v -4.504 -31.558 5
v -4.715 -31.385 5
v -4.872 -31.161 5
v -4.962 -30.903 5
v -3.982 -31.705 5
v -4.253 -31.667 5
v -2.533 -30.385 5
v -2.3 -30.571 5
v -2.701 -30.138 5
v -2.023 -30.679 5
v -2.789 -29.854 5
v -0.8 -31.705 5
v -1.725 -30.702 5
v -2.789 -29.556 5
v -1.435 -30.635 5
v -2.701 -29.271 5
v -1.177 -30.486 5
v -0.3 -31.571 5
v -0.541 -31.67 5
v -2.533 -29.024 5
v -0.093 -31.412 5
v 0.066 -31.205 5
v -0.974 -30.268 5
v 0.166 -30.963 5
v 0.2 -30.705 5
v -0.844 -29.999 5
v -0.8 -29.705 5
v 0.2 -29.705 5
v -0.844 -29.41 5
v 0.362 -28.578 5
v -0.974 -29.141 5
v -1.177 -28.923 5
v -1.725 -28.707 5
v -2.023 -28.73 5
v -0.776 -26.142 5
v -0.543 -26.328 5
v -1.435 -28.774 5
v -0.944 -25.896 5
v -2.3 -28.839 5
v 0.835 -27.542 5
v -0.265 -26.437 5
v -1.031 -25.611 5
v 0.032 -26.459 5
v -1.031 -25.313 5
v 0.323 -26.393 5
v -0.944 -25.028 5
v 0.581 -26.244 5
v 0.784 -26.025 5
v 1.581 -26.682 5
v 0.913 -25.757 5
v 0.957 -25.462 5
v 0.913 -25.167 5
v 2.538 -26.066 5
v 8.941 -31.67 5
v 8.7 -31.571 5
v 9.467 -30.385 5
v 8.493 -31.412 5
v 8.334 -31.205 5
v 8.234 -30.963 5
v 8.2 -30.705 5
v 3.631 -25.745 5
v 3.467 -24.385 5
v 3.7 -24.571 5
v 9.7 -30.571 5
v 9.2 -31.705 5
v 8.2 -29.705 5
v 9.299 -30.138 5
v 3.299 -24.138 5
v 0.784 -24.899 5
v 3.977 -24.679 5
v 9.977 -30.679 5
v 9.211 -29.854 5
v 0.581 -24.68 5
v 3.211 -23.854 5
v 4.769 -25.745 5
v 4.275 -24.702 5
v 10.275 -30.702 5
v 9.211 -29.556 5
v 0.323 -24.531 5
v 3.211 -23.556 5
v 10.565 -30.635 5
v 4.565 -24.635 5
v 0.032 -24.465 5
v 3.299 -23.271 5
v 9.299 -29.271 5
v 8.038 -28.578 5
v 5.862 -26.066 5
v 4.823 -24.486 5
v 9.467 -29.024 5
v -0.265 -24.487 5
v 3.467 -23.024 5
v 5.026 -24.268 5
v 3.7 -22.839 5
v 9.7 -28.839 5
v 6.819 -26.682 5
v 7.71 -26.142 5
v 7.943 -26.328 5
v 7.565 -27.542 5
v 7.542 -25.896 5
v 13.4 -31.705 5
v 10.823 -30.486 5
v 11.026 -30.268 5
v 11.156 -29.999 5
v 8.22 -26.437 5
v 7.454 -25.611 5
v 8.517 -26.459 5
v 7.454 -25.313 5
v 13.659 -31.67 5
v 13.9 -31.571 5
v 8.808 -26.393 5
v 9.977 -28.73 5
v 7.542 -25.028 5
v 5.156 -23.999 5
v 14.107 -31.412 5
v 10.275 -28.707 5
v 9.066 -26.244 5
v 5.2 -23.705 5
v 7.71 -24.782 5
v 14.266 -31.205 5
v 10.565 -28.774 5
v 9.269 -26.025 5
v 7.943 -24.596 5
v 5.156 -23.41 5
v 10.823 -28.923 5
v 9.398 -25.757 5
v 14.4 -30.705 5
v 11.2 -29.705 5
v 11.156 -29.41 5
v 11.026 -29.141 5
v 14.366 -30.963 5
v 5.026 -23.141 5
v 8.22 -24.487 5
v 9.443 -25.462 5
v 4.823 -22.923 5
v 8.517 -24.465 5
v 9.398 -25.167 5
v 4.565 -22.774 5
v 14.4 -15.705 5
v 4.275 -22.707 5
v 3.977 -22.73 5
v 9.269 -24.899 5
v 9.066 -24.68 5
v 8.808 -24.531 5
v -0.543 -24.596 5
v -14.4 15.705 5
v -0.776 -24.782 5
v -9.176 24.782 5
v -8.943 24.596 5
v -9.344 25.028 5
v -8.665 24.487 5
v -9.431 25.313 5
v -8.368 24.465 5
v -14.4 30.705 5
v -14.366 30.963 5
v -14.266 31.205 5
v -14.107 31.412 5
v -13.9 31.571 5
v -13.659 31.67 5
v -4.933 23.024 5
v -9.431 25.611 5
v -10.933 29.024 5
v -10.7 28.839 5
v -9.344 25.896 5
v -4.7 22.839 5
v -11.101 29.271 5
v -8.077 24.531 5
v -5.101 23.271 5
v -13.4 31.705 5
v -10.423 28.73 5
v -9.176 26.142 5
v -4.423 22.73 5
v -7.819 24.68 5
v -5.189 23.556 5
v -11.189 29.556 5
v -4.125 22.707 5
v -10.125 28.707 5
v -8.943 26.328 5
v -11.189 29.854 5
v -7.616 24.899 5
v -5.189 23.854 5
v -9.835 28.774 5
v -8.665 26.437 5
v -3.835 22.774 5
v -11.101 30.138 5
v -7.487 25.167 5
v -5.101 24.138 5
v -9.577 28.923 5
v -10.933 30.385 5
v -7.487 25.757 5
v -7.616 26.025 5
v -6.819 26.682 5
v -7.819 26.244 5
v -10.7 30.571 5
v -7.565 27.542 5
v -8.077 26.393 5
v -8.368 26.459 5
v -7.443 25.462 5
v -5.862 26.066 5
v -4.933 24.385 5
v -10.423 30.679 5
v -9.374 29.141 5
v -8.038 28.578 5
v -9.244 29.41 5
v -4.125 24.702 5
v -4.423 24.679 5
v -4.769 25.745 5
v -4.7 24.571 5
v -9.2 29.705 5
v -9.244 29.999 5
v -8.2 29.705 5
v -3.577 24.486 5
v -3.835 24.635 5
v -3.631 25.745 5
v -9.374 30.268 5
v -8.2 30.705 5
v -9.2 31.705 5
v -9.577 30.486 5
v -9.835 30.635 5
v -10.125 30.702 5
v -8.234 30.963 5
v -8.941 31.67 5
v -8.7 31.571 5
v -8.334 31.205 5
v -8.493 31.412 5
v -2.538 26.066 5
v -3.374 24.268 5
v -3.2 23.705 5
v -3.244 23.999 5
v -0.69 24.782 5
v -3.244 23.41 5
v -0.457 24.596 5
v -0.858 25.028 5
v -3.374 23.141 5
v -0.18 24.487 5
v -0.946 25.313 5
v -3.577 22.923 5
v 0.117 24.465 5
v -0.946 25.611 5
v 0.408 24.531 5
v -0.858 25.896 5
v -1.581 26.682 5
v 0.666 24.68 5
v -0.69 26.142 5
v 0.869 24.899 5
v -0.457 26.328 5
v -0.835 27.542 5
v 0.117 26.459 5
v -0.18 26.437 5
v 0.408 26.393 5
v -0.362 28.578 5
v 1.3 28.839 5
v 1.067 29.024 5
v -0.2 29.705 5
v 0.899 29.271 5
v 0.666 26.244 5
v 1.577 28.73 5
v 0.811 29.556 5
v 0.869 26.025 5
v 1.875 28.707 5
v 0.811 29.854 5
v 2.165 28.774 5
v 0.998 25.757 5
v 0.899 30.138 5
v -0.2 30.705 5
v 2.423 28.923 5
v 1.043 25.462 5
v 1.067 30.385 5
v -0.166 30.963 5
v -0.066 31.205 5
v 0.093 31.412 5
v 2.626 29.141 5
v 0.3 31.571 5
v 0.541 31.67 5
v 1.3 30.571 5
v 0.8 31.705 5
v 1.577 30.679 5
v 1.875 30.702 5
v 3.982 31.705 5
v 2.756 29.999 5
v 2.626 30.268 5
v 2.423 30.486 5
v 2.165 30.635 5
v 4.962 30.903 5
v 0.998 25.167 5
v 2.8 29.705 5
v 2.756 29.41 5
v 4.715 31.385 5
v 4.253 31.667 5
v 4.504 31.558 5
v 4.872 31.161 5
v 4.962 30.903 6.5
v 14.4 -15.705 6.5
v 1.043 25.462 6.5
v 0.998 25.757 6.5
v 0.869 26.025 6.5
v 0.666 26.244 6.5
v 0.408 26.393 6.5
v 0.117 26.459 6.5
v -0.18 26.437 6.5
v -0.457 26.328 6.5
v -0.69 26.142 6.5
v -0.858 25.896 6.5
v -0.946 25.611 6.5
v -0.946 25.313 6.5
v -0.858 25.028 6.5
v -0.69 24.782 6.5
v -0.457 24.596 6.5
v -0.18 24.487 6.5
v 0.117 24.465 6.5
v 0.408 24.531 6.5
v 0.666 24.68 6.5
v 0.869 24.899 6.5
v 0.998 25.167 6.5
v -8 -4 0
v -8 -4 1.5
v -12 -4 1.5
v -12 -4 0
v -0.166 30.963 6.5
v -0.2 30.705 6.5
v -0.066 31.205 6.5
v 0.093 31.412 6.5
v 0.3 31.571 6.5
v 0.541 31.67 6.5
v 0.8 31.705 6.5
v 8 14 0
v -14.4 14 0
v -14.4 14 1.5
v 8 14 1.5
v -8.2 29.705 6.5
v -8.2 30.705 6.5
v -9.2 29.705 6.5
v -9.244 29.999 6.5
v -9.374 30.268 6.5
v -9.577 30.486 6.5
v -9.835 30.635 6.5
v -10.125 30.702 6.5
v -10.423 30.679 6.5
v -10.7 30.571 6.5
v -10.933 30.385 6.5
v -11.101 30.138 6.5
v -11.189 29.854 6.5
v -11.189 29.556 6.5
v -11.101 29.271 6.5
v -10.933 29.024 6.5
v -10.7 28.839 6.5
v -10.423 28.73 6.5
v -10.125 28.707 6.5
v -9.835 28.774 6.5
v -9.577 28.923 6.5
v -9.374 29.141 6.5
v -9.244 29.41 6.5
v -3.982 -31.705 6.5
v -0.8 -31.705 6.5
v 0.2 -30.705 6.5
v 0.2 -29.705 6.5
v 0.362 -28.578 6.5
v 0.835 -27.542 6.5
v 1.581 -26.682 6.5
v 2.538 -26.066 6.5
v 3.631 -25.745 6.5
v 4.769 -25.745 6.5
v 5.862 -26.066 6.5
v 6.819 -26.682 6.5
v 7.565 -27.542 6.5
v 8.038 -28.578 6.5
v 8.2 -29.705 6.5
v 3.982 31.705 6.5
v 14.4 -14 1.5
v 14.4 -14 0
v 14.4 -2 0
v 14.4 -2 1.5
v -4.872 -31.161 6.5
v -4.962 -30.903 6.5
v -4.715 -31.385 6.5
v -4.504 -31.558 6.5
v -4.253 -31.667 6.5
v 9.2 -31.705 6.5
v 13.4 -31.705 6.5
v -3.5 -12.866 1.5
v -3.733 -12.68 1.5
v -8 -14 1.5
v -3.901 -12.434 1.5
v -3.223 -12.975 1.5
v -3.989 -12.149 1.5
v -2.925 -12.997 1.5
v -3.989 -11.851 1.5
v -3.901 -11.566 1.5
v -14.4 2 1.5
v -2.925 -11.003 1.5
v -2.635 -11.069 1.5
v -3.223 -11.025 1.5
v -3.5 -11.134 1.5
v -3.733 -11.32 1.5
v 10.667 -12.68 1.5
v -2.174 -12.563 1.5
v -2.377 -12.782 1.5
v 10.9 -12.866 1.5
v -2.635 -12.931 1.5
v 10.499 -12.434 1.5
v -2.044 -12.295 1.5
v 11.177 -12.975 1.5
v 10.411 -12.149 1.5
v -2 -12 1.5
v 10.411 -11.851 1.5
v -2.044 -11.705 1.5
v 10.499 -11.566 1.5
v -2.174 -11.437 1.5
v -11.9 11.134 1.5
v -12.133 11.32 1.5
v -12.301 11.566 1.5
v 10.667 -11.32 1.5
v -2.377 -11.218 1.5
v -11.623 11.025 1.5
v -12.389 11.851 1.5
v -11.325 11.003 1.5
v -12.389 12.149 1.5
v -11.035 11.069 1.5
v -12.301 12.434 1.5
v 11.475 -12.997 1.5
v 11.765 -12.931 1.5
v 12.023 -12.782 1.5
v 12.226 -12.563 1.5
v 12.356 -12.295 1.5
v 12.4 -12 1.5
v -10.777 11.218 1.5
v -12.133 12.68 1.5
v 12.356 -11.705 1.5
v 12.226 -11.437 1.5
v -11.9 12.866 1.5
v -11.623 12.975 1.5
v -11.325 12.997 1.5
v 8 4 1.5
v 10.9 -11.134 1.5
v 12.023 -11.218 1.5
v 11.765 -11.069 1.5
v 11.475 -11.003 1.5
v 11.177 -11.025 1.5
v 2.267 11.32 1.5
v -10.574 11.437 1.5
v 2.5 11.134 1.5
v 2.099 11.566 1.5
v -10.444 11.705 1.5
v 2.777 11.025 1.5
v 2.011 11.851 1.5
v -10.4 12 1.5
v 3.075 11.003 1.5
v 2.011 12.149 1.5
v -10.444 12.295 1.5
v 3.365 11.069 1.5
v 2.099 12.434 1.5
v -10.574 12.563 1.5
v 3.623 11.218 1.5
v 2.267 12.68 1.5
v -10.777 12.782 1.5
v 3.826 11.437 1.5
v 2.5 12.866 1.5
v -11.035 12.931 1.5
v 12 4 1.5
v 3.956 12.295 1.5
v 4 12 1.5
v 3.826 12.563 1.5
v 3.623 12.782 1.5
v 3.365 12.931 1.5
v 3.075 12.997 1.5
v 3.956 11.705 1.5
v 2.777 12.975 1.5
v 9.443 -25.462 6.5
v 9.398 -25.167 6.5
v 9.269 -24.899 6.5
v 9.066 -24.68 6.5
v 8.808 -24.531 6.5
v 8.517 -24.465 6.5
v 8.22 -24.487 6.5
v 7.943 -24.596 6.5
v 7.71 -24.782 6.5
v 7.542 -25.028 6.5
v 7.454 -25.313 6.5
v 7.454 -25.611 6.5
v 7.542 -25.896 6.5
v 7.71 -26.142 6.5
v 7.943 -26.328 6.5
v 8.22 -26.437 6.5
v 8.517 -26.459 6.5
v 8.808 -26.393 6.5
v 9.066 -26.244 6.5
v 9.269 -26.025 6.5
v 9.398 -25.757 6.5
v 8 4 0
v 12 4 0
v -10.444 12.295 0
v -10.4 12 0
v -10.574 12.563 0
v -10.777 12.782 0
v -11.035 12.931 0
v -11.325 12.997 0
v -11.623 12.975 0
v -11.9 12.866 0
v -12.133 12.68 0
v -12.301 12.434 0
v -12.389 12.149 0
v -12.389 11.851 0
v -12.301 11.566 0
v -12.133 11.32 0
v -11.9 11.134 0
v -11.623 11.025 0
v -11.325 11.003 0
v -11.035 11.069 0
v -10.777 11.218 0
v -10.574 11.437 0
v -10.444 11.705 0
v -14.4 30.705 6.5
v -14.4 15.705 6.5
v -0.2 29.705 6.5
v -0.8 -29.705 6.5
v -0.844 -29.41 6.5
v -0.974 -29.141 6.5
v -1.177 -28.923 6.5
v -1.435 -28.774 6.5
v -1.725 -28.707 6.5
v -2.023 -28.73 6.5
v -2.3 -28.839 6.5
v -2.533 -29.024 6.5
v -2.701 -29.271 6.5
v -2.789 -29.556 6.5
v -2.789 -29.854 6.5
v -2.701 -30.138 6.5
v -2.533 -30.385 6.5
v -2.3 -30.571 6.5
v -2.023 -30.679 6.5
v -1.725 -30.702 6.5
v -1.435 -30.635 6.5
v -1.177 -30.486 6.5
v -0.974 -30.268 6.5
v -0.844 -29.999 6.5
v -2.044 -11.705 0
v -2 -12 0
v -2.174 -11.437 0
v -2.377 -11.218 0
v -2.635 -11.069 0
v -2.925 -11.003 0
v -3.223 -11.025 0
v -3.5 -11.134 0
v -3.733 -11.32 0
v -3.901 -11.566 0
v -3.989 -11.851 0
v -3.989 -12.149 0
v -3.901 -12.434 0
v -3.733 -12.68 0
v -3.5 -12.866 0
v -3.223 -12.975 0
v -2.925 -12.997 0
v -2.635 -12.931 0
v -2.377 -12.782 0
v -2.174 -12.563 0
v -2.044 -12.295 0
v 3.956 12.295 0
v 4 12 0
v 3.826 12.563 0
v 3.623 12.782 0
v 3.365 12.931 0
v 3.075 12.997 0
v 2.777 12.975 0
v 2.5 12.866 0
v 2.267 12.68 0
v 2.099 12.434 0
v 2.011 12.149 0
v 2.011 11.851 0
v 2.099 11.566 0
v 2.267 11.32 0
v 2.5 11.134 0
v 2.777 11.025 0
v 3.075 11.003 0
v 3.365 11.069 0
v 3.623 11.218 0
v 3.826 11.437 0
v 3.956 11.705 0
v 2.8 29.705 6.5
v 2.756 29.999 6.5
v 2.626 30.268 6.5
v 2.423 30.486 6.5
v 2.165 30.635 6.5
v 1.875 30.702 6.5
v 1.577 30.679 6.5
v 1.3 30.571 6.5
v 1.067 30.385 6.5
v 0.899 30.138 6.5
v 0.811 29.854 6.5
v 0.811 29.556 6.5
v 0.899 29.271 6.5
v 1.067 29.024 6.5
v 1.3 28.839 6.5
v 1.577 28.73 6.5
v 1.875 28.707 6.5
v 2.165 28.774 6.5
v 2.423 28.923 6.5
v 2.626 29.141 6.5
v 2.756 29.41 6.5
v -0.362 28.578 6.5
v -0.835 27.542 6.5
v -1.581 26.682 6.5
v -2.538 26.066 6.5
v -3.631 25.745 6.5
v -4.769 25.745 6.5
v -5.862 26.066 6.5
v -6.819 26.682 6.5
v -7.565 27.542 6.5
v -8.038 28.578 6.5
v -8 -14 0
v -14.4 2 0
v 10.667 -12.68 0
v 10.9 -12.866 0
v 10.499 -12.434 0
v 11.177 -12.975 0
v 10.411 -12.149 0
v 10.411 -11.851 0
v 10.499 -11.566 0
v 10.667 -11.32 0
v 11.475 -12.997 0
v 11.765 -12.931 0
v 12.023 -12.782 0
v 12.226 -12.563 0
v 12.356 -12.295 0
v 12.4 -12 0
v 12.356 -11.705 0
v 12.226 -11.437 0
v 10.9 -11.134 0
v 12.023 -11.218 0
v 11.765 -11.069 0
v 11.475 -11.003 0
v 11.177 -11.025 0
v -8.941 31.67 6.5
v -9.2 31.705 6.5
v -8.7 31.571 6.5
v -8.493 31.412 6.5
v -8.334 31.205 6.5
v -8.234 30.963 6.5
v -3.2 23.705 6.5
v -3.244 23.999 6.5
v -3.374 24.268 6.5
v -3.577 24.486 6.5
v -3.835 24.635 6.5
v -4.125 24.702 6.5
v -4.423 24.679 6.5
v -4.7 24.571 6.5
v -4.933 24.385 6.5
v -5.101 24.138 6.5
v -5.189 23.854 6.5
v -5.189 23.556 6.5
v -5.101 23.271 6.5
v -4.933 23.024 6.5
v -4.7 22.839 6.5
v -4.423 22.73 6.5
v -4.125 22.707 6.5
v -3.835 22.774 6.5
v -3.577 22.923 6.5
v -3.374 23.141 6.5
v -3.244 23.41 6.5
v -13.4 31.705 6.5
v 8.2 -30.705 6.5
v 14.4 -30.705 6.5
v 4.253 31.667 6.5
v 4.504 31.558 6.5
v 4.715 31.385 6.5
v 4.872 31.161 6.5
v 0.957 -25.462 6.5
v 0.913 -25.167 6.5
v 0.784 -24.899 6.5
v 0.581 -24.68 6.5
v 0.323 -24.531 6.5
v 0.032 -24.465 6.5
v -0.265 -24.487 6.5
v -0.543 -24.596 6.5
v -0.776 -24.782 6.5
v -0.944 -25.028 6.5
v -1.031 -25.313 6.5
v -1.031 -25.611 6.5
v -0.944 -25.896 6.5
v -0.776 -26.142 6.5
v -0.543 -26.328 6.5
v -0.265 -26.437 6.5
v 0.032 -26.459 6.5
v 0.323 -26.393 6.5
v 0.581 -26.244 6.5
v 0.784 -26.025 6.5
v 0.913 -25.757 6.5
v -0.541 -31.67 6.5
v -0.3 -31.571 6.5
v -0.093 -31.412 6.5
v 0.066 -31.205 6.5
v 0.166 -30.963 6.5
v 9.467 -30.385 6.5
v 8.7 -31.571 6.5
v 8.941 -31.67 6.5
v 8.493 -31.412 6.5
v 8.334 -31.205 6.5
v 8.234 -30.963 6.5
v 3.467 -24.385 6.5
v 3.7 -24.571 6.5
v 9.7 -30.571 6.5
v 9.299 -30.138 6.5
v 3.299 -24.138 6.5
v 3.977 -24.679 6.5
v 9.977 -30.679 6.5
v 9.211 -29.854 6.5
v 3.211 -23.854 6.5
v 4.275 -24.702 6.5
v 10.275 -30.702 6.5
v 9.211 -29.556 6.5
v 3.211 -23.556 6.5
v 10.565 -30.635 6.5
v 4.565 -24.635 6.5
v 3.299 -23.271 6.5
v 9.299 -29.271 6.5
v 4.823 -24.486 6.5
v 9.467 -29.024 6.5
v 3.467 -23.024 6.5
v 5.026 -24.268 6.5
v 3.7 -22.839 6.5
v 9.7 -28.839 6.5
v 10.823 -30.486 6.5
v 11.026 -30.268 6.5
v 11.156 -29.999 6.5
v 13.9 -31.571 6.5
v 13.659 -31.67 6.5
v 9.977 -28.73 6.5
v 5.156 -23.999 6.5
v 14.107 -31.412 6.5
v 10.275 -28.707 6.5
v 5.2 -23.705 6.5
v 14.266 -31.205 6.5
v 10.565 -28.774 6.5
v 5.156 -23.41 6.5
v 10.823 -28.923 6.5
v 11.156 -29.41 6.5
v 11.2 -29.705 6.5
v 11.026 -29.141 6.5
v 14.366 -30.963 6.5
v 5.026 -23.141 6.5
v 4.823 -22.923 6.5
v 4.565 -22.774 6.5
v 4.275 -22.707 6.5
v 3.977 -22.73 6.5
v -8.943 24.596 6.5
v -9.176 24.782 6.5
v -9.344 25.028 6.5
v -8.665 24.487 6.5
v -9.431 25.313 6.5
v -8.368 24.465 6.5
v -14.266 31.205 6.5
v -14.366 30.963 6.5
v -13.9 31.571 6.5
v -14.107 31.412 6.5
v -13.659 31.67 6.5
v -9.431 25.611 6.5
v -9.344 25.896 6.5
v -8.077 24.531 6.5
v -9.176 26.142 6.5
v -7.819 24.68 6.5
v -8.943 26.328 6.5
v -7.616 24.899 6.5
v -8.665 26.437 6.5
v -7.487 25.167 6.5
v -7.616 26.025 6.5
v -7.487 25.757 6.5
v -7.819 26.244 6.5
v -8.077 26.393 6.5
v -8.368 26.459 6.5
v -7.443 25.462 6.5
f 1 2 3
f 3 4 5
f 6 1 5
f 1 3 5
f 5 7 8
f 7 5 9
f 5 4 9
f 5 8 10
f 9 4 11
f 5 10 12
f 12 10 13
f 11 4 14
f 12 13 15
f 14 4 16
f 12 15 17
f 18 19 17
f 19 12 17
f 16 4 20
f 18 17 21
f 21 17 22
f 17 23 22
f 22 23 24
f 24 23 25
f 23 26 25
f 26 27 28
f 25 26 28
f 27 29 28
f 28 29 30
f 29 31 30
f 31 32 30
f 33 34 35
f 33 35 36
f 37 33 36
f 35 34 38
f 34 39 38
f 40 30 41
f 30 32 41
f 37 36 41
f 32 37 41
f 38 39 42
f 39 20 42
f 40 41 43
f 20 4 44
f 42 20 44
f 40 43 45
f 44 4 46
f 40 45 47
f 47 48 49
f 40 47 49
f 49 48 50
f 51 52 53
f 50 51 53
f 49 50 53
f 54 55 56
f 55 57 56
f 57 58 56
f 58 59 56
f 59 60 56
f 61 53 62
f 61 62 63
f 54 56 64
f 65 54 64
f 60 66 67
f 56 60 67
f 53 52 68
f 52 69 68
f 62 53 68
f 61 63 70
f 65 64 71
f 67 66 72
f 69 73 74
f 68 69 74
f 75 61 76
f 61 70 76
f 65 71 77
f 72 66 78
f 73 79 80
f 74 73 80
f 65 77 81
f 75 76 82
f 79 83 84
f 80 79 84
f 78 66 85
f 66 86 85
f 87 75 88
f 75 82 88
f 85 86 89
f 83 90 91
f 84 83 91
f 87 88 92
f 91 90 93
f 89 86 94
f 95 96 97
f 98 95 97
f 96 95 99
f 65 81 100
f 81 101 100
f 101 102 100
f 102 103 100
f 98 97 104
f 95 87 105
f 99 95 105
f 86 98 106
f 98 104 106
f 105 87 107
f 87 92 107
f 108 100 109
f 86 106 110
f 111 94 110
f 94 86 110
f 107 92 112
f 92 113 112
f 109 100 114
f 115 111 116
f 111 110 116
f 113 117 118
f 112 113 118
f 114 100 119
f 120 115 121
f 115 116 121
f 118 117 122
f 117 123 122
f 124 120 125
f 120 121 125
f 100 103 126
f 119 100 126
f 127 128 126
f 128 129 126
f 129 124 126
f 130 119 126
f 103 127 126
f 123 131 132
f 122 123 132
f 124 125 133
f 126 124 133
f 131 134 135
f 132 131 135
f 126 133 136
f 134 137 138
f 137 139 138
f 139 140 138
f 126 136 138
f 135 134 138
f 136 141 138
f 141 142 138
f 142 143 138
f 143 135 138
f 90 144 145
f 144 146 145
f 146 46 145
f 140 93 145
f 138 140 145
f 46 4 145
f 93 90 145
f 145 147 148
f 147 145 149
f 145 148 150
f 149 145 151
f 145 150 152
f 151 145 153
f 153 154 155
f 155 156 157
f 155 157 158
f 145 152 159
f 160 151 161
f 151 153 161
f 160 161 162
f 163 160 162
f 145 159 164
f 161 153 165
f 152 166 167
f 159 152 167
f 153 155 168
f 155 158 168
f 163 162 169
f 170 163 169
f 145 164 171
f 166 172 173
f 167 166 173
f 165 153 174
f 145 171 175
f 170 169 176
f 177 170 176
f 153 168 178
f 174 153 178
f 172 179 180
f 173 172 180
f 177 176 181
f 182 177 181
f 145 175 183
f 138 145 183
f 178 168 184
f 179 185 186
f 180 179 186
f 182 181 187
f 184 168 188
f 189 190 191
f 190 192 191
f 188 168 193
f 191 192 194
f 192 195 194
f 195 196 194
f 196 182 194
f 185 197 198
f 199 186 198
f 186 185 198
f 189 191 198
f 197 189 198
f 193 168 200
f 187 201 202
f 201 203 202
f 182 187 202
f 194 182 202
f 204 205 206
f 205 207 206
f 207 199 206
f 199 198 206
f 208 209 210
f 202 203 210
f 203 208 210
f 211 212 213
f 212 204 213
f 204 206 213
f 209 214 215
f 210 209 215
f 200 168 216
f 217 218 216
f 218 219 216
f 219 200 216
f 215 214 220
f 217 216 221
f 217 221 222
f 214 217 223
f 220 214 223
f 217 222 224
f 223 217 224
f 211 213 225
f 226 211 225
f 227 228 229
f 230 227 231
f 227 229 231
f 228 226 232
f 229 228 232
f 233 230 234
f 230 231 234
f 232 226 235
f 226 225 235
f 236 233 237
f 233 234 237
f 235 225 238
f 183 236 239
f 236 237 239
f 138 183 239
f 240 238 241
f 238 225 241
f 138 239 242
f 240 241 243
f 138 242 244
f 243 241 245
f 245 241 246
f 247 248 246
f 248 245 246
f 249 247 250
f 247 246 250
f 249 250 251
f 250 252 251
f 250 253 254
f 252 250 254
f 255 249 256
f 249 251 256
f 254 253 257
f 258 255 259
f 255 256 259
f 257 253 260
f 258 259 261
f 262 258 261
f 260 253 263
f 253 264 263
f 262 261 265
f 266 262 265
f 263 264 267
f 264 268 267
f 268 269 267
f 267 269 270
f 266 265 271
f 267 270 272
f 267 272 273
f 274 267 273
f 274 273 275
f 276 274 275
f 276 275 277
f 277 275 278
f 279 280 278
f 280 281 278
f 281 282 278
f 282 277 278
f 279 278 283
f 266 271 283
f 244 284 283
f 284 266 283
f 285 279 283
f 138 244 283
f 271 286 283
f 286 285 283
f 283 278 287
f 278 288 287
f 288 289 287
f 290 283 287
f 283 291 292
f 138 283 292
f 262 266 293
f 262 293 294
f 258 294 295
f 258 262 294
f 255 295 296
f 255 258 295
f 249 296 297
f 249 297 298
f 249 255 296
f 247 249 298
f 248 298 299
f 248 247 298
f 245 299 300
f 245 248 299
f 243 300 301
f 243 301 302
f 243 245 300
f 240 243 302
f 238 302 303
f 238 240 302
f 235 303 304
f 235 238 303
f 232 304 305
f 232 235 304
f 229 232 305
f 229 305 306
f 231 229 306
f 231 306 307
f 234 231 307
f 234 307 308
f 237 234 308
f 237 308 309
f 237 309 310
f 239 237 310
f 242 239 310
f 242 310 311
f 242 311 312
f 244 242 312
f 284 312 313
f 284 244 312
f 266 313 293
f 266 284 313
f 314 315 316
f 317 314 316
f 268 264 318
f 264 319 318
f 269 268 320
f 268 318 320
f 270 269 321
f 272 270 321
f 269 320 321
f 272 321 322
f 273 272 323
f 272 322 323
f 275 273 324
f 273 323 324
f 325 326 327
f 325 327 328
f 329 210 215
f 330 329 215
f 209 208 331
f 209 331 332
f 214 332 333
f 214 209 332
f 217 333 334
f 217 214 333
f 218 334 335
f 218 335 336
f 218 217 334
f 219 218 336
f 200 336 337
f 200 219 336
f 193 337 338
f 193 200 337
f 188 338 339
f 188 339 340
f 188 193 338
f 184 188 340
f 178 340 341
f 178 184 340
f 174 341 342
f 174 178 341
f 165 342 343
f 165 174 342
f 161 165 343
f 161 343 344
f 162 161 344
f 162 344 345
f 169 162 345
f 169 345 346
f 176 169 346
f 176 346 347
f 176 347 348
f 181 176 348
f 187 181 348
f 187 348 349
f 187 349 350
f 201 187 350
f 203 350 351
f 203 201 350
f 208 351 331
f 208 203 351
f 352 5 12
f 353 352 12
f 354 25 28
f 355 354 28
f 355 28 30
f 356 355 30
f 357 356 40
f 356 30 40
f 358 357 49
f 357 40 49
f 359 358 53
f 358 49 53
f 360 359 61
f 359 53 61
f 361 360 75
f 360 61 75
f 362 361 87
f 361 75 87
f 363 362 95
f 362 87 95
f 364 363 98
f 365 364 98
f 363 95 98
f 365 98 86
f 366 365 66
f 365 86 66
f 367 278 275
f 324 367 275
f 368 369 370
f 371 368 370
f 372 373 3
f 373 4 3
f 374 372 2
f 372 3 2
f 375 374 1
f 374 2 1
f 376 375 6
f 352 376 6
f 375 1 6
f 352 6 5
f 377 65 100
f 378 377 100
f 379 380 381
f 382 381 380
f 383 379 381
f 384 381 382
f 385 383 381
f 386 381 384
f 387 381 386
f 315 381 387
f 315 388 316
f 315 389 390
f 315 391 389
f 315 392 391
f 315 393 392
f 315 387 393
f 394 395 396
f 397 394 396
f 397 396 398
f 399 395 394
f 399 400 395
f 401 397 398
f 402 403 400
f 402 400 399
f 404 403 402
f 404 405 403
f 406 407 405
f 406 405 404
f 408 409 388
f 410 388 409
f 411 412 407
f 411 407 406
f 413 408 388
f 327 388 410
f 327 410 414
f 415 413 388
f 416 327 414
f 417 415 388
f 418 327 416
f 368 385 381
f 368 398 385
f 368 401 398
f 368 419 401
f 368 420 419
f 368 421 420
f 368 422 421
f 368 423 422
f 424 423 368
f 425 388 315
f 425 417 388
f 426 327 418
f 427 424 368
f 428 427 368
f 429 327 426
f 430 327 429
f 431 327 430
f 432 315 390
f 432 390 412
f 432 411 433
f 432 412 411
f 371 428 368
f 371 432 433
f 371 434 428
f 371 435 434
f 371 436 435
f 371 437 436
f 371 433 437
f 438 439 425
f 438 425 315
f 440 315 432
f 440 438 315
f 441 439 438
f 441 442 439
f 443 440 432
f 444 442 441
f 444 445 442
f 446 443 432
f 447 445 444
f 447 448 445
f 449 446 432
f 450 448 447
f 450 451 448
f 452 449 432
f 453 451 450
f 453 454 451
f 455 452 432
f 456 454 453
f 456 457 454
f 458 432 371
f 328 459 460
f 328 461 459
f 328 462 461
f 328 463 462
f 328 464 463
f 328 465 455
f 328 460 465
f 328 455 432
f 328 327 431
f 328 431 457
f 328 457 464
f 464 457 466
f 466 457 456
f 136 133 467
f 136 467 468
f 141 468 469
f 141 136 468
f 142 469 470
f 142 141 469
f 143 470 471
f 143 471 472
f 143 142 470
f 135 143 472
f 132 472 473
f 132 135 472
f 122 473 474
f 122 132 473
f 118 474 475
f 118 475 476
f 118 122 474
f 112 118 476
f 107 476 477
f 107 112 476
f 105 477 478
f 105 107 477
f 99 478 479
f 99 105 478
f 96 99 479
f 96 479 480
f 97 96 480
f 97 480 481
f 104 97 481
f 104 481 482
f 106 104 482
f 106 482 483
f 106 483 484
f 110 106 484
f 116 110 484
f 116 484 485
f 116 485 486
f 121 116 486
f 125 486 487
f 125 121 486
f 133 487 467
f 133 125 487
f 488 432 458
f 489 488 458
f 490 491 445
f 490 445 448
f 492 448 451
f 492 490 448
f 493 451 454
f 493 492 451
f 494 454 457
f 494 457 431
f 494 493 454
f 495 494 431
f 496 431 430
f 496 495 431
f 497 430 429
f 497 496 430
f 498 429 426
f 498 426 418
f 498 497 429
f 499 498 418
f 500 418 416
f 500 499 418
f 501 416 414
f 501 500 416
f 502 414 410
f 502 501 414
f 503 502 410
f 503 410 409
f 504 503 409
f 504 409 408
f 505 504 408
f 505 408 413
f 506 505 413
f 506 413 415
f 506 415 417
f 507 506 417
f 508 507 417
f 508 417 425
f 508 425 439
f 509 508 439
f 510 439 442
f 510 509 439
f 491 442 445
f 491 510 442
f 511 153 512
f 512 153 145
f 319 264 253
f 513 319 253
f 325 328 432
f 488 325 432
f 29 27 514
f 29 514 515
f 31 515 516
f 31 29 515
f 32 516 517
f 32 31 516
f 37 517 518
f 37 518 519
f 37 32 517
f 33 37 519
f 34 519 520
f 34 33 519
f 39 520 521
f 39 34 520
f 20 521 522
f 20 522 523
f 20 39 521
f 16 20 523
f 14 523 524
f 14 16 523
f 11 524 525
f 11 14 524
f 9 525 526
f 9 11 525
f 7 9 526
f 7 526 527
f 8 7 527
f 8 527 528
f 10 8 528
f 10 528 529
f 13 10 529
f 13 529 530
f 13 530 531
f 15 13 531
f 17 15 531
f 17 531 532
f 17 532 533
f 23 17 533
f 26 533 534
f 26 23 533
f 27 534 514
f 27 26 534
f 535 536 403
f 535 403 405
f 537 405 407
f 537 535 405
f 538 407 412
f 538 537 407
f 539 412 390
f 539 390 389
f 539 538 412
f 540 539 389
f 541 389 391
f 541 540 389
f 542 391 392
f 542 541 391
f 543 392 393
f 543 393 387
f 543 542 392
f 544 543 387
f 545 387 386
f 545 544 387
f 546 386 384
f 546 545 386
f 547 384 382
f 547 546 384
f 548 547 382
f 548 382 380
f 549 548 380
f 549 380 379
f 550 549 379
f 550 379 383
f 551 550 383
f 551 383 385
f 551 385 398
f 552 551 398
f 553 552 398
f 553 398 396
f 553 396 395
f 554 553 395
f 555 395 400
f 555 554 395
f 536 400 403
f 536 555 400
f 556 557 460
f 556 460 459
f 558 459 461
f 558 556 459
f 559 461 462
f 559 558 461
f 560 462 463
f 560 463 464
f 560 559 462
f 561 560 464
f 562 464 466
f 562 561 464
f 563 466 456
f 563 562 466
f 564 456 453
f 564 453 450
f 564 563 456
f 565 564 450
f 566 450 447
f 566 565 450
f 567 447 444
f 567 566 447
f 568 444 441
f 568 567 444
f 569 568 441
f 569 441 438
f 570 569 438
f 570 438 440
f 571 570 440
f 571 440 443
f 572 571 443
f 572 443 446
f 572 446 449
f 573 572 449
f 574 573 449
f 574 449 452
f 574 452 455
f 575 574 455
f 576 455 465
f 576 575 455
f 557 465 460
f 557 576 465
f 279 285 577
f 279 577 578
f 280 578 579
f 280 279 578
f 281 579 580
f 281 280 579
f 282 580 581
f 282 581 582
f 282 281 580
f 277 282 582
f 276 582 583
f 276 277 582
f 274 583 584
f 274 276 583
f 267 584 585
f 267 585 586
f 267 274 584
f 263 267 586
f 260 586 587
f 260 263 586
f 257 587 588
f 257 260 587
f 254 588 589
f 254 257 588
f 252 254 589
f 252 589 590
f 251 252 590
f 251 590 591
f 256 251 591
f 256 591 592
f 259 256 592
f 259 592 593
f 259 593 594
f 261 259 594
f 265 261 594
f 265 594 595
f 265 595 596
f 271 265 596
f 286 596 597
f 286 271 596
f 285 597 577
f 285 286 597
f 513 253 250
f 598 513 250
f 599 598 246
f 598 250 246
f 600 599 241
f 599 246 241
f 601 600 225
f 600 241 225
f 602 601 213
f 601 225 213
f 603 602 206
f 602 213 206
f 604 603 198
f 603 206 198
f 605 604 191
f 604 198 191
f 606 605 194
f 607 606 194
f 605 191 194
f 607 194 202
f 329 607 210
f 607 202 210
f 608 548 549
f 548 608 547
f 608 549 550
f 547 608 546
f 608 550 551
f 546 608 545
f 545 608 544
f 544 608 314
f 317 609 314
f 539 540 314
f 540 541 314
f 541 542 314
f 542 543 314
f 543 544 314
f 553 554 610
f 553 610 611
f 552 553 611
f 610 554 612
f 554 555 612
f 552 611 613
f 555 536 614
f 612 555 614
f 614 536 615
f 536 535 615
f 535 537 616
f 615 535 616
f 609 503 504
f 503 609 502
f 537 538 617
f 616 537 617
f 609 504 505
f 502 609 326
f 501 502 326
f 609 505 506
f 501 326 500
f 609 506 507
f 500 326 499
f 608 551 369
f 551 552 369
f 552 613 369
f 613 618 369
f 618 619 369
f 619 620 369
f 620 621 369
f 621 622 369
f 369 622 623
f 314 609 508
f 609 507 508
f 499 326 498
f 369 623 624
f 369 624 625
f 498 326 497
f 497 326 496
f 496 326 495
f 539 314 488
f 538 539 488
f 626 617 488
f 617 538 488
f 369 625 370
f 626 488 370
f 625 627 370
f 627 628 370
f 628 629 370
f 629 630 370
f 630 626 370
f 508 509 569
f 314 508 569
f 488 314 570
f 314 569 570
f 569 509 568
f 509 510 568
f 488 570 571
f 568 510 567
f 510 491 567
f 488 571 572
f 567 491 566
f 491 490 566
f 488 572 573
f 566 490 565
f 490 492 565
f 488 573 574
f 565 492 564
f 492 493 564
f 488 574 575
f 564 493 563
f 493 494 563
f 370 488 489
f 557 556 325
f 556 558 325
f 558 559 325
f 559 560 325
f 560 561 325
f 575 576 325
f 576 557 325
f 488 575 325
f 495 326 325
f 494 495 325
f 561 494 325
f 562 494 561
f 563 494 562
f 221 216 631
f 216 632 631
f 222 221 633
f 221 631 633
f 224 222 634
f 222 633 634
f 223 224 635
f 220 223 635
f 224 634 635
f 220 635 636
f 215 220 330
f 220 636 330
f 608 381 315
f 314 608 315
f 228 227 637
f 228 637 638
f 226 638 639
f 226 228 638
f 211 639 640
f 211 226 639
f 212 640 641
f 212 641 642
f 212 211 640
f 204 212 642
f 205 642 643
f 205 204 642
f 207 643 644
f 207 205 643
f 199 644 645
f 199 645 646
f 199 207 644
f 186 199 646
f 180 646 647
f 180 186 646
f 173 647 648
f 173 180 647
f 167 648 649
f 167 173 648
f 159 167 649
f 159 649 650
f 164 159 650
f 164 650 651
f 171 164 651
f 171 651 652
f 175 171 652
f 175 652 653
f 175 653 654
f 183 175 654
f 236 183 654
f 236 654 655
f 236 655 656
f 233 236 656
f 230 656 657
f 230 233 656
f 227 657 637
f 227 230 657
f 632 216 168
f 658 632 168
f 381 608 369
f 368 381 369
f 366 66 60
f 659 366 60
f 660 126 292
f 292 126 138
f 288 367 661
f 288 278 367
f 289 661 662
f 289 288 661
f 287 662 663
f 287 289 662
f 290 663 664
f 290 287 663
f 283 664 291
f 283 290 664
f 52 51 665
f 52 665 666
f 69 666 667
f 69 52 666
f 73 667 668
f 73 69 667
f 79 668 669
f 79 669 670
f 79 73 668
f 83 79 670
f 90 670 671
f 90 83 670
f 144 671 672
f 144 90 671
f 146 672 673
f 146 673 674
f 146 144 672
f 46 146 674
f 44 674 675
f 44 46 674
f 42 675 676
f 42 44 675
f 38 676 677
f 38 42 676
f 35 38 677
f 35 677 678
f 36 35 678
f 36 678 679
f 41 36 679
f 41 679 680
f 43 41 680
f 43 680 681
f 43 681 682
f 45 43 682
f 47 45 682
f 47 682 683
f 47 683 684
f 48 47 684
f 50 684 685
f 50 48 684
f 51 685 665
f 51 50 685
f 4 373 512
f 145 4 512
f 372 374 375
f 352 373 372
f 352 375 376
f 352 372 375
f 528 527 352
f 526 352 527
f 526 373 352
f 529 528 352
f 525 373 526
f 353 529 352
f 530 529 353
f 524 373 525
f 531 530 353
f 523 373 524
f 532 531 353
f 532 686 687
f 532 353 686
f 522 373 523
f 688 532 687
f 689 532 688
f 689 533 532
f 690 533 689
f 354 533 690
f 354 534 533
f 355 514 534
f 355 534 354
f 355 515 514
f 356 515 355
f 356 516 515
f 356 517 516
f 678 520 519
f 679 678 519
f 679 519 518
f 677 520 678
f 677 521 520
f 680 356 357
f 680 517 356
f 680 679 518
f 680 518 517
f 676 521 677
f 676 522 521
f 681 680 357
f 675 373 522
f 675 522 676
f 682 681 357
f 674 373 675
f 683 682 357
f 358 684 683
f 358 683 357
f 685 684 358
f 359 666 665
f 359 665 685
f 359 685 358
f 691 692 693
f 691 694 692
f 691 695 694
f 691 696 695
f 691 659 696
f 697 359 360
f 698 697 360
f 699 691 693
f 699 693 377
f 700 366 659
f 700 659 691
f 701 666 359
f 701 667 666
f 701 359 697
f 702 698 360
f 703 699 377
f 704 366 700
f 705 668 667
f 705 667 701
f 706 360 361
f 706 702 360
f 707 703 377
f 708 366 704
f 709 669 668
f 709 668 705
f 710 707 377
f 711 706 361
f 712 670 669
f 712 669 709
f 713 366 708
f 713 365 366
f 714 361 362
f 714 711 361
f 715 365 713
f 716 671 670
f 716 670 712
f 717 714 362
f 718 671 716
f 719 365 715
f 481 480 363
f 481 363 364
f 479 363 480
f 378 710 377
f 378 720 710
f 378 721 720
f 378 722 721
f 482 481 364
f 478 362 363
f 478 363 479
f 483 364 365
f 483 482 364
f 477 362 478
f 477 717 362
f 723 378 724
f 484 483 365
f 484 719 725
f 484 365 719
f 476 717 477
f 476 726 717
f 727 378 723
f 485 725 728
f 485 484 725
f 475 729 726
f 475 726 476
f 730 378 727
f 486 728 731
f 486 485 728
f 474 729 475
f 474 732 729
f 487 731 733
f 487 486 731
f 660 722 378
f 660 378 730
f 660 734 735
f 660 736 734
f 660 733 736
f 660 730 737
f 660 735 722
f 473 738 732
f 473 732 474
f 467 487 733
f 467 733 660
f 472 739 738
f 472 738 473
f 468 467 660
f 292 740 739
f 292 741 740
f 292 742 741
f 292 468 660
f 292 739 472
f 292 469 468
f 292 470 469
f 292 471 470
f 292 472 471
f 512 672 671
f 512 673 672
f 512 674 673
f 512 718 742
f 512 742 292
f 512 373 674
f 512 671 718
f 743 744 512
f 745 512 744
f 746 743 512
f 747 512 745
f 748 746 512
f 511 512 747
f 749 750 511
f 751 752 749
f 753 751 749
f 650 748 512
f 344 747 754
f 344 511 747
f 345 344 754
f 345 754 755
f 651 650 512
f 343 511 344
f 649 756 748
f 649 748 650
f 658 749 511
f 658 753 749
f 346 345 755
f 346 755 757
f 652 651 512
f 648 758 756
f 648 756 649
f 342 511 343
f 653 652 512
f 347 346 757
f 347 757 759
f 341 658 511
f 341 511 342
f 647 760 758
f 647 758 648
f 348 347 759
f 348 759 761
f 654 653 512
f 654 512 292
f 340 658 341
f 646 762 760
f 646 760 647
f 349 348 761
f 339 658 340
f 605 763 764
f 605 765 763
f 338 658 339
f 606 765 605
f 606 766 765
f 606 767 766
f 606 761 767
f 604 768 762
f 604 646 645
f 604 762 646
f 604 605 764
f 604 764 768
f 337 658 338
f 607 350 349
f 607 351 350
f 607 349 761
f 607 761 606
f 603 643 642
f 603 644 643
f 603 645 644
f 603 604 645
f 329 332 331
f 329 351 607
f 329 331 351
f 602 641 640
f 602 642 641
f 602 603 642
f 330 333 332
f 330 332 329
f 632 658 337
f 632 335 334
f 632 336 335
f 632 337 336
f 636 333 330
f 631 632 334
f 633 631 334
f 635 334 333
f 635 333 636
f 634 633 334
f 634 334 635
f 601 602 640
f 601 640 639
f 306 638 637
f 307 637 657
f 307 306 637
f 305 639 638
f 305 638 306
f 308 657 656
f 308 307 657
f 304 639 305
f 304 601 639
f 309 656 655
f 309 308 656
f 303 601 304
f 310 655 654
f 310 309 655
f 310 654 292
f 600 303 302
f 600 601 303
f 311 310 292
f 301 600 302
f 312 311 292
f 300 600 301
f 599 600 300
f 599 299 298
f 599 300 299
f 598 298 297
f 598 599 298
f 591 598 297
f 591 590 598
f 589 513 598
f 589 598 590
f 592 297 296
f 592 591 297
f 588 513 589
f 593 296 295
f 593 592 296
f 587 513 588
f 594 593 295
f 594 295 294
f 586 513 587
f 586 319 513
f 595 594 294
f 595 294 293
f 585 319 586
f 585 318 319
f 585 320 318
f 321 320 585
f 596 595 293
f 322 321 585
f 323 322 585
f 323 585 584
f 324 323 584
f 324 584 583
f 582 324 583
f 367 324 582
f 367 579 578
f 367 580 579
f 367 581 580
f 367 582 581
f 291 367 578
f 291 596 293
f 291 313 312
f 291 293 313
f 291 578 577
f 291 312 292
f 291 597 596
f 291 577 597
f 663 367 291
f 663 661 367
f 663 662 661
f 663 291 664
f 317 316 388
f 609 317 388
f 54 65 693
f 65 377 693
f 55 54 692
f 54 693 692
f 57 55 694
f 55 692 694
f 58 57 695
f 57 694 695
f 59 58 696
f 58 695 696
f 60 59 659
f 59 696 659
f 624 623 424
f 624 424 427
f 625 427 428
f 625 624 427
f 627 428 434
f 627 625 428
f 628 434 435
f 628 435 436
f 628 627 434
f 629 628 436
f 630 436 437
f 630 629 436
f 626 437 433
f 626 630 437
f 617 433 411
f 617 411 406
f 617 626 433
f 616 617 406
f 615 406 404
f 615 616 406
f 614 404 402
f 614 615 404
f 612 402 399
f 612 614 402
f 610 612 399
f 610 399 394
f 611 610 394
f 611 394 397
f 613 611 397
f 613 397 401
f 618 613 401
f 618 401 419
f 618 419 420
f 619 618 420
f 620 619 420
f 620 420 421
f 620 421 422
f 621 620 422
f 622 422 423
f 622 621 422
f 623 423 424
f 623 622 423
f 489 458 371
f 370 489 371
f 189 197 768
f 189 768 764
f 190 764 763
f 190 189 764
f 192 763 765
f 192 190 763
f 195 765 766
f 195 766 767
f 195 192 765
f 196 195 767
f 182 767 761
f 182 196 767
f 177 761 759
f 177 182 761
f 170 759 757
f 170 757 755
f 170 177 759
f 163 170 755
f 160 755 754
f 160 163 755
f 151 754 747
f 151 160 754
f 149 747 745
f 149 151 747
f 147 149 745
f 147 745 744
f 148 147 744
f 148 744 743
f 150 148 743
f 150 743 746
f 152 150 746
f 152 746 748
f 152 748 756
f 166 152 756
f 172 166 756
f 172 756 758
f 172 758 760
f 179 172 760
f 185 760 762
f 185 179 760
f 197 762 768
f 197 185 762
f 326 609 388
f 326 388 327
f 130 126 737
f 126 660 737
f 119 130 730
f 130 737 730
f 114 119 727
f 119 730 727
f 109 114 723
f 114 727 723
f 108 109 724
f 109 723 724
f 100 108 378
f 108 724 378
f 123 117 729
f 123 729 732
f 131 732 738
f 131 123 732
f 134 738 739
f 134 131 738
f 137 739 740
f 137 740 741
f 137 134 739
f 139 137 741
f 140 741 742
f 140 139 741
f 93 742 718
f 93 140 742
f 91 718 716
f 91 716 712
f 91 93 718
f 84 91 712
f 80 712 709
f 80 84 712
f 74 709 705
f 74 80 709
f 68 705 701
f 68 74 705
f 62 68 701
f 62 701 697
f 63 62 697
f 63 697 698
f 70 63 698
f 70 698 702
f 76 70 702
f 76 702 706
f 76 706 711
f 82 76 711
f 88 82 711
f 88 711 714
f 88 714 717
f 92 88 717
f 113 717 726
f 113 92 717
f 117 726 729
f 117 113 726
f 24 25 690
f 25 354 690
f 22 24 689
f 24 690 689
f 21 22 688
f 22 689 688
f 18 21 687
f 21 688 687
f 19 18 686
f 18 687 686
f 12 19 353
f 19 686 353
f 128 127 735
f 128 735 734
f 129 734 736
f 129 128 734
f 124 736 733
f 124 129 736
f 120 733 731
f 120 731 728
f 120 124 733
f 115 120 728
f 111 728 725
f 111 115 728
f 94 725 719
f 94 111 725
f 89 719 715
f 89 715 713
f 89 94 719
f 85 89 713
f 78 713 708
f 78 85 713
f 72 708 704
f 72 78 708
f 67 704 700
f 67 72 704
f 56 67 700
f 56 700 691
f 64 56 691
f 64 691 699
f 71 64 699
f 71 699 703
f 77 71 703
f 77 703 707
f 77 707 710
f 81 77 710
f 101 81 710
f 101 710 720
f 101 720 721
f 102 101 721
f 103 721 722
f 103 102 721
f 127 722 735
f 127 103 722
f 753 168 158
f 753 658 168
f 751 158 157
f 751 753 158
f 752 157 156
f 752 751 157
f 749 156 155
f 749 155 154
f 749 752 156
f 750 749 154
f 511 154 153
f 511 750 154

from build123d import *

# Parameters (mm, degrees)
F0_W     = 28.8
F0_H     = 28
F0_R     = 1
F1_DEPTH = 1.5
F3_DEPTH = 1.5
F5_R     = 1
F6_DEPTH = 1.5
F8_DEPTH = 1.5
F9_R     = 1


with BuildPart() as f1:
    # F0 (on Top) → F1 (new body)
    with BuildSketch(Plane.XY):
        Rectangle(F0_W, F0_H)
        with Locations((-3, -12)):
            Circle(F0_R, mode=Mode.SUBTRACT)
        with Locations((11.4, -12)):
            Circle(F0_R, mode=Mode.SUBTRACT)
        with Locations((-11.4, 12)):
            Circle(F0_R, mode=Mode.SUBTRACT)
        with Locations((3, 12)):
            Circle(F0_R, mode=Mode.SUBTRACT)
    extrude(amount=F1_DEPTH)

    # F2 (on face) → F3 (cut, through all)
    with BuildSketch(Plane.XY.offset(1.5)):
        Polygon((-12, -4), (-14.4, 2), (-14.4, -14), (-8, -14), (-8, -4), align=None)
        Polygon((14.4, -2), (14.4, 14), (8, 14), (8, 4), (12, 4), align=None)
    extrude(amount=-F3_DEPTH, mode=Mode.SUBTRACT)


with BuildPart() as f6:
    # F5 (on offset) → F6 (new body)
    with BuildSketch(Plane.XY.offset(5)):
        with BuildLine():
            Line((-8.2, 31.7045451068), (-14.4, 31.7045451068))
            Line((-14.4, 31.7045451068), (-14.4, -31.7045451068))
            Line((-14.4, -31.7045451068), (0.2, -31.7045451068))
            Line((0.2, -31.7045451068), (0.2, -29.7045451068))
            ThreePointArc((0.2, -29.7045451068), (4.2, -25.7045451068), (8.2, -29.7045451068))
            Line((8.2, -29.7045451068), (8.2, -31.7045451068))
            Line((8.2, -31.7045451068), (14.4, -31.7045451068))
            Line((14.4, -31.7045451068), (14.4, 31.7045451068))
            Line((14.4, 31.7045451068), (-0.2, 31.7045451068))
            Line((-0.2, 31.7045451068), (-0.2, 29.7045451068))
            ThreePointArc((-0.2, 29.7045451068), (-4.2, 25.7045451068), (-8.2, 29.7045451068))
            Line((-8.2, 29.7045451068), (-8.2, 31.7045451068))
        make_face()
        with Locations((-1.8, -29.7045451068)):
            Circle(F5_R, mode=Mode.SUBTRACT)
        with Locations((-0.0426406871, -25.4619044196)):
            Circle(F5_R, mode=Mode.SUBTRACT)
        with Locations((4.2, -23.7045451068)):
            Circle(F5_R, mode=Mode.SUBTRACT)
        with Locations((10.2, -29.7045451068)):
            Circle(F5_R, mode=Mode.SUBTRACT)
        with Locations((8.4426406871, -25.4619044196)):
            Circle(F5_R, mode=Mode.SUBTRACT)
        with Locations((-8.4426406871, 25.4619044196)):
            Circle(F5_R, mode=Mode.SUBTRACT)
        with Locations((-10.2, 29.7045451068)):
            Circle(F5_R, mode=Mode.SUBTRACT)
        with Locations((-4.2, 23.7045451068)):
            Circle(F5_R, mode=Mode.SUBTRACT)
        with Locations((0.0426406871, 25.4619044196)):
            Circle(F5_R, mode=Mode.SUBTRACT)
        with Locations((1.8, 29.7045451068)):
            Circle(F5_R, mode=Mode.SUBTRACT)
    extrude(amount=F6_DEPTH)

    # F7 (on face) → F8 (cut, through all)
    with BuildSketch(Plane.XY.offset(6.5)):
        Polygon((-4.8, -31.7045451068), (-14.4, 15.7045451068), (-14.4, -31.7045451068), align=None)
        Polygon((4.8, 31.7045451068), (14.4, -15.7045451068), (14.4, 31.7045451068), align=None)
    extrude(amount=-F8_DEPTH, mode=Mode.SUBTRACT)

    # F9
    f9_edges = [f6.edges().sort_by_distance(p)[0] for p in [
        (-4.8, -31.704545, 5.75),
        (0.2, -31.704545, 5.75),
        (8.2, -31.704545, 5.75),
        (14.4, -31.704545, 5.75),
        (4.8, 31.704545, 5.75),
        (-0.2, 31.704545, 5.75),
        (-8.2, 31.704545, 5.75),
        (-14.4, 31.704545, 5.75),
    ]]
    fillet(f9_edges, radius=F9_R)


solid = Compound([f1.part, f6.part])
